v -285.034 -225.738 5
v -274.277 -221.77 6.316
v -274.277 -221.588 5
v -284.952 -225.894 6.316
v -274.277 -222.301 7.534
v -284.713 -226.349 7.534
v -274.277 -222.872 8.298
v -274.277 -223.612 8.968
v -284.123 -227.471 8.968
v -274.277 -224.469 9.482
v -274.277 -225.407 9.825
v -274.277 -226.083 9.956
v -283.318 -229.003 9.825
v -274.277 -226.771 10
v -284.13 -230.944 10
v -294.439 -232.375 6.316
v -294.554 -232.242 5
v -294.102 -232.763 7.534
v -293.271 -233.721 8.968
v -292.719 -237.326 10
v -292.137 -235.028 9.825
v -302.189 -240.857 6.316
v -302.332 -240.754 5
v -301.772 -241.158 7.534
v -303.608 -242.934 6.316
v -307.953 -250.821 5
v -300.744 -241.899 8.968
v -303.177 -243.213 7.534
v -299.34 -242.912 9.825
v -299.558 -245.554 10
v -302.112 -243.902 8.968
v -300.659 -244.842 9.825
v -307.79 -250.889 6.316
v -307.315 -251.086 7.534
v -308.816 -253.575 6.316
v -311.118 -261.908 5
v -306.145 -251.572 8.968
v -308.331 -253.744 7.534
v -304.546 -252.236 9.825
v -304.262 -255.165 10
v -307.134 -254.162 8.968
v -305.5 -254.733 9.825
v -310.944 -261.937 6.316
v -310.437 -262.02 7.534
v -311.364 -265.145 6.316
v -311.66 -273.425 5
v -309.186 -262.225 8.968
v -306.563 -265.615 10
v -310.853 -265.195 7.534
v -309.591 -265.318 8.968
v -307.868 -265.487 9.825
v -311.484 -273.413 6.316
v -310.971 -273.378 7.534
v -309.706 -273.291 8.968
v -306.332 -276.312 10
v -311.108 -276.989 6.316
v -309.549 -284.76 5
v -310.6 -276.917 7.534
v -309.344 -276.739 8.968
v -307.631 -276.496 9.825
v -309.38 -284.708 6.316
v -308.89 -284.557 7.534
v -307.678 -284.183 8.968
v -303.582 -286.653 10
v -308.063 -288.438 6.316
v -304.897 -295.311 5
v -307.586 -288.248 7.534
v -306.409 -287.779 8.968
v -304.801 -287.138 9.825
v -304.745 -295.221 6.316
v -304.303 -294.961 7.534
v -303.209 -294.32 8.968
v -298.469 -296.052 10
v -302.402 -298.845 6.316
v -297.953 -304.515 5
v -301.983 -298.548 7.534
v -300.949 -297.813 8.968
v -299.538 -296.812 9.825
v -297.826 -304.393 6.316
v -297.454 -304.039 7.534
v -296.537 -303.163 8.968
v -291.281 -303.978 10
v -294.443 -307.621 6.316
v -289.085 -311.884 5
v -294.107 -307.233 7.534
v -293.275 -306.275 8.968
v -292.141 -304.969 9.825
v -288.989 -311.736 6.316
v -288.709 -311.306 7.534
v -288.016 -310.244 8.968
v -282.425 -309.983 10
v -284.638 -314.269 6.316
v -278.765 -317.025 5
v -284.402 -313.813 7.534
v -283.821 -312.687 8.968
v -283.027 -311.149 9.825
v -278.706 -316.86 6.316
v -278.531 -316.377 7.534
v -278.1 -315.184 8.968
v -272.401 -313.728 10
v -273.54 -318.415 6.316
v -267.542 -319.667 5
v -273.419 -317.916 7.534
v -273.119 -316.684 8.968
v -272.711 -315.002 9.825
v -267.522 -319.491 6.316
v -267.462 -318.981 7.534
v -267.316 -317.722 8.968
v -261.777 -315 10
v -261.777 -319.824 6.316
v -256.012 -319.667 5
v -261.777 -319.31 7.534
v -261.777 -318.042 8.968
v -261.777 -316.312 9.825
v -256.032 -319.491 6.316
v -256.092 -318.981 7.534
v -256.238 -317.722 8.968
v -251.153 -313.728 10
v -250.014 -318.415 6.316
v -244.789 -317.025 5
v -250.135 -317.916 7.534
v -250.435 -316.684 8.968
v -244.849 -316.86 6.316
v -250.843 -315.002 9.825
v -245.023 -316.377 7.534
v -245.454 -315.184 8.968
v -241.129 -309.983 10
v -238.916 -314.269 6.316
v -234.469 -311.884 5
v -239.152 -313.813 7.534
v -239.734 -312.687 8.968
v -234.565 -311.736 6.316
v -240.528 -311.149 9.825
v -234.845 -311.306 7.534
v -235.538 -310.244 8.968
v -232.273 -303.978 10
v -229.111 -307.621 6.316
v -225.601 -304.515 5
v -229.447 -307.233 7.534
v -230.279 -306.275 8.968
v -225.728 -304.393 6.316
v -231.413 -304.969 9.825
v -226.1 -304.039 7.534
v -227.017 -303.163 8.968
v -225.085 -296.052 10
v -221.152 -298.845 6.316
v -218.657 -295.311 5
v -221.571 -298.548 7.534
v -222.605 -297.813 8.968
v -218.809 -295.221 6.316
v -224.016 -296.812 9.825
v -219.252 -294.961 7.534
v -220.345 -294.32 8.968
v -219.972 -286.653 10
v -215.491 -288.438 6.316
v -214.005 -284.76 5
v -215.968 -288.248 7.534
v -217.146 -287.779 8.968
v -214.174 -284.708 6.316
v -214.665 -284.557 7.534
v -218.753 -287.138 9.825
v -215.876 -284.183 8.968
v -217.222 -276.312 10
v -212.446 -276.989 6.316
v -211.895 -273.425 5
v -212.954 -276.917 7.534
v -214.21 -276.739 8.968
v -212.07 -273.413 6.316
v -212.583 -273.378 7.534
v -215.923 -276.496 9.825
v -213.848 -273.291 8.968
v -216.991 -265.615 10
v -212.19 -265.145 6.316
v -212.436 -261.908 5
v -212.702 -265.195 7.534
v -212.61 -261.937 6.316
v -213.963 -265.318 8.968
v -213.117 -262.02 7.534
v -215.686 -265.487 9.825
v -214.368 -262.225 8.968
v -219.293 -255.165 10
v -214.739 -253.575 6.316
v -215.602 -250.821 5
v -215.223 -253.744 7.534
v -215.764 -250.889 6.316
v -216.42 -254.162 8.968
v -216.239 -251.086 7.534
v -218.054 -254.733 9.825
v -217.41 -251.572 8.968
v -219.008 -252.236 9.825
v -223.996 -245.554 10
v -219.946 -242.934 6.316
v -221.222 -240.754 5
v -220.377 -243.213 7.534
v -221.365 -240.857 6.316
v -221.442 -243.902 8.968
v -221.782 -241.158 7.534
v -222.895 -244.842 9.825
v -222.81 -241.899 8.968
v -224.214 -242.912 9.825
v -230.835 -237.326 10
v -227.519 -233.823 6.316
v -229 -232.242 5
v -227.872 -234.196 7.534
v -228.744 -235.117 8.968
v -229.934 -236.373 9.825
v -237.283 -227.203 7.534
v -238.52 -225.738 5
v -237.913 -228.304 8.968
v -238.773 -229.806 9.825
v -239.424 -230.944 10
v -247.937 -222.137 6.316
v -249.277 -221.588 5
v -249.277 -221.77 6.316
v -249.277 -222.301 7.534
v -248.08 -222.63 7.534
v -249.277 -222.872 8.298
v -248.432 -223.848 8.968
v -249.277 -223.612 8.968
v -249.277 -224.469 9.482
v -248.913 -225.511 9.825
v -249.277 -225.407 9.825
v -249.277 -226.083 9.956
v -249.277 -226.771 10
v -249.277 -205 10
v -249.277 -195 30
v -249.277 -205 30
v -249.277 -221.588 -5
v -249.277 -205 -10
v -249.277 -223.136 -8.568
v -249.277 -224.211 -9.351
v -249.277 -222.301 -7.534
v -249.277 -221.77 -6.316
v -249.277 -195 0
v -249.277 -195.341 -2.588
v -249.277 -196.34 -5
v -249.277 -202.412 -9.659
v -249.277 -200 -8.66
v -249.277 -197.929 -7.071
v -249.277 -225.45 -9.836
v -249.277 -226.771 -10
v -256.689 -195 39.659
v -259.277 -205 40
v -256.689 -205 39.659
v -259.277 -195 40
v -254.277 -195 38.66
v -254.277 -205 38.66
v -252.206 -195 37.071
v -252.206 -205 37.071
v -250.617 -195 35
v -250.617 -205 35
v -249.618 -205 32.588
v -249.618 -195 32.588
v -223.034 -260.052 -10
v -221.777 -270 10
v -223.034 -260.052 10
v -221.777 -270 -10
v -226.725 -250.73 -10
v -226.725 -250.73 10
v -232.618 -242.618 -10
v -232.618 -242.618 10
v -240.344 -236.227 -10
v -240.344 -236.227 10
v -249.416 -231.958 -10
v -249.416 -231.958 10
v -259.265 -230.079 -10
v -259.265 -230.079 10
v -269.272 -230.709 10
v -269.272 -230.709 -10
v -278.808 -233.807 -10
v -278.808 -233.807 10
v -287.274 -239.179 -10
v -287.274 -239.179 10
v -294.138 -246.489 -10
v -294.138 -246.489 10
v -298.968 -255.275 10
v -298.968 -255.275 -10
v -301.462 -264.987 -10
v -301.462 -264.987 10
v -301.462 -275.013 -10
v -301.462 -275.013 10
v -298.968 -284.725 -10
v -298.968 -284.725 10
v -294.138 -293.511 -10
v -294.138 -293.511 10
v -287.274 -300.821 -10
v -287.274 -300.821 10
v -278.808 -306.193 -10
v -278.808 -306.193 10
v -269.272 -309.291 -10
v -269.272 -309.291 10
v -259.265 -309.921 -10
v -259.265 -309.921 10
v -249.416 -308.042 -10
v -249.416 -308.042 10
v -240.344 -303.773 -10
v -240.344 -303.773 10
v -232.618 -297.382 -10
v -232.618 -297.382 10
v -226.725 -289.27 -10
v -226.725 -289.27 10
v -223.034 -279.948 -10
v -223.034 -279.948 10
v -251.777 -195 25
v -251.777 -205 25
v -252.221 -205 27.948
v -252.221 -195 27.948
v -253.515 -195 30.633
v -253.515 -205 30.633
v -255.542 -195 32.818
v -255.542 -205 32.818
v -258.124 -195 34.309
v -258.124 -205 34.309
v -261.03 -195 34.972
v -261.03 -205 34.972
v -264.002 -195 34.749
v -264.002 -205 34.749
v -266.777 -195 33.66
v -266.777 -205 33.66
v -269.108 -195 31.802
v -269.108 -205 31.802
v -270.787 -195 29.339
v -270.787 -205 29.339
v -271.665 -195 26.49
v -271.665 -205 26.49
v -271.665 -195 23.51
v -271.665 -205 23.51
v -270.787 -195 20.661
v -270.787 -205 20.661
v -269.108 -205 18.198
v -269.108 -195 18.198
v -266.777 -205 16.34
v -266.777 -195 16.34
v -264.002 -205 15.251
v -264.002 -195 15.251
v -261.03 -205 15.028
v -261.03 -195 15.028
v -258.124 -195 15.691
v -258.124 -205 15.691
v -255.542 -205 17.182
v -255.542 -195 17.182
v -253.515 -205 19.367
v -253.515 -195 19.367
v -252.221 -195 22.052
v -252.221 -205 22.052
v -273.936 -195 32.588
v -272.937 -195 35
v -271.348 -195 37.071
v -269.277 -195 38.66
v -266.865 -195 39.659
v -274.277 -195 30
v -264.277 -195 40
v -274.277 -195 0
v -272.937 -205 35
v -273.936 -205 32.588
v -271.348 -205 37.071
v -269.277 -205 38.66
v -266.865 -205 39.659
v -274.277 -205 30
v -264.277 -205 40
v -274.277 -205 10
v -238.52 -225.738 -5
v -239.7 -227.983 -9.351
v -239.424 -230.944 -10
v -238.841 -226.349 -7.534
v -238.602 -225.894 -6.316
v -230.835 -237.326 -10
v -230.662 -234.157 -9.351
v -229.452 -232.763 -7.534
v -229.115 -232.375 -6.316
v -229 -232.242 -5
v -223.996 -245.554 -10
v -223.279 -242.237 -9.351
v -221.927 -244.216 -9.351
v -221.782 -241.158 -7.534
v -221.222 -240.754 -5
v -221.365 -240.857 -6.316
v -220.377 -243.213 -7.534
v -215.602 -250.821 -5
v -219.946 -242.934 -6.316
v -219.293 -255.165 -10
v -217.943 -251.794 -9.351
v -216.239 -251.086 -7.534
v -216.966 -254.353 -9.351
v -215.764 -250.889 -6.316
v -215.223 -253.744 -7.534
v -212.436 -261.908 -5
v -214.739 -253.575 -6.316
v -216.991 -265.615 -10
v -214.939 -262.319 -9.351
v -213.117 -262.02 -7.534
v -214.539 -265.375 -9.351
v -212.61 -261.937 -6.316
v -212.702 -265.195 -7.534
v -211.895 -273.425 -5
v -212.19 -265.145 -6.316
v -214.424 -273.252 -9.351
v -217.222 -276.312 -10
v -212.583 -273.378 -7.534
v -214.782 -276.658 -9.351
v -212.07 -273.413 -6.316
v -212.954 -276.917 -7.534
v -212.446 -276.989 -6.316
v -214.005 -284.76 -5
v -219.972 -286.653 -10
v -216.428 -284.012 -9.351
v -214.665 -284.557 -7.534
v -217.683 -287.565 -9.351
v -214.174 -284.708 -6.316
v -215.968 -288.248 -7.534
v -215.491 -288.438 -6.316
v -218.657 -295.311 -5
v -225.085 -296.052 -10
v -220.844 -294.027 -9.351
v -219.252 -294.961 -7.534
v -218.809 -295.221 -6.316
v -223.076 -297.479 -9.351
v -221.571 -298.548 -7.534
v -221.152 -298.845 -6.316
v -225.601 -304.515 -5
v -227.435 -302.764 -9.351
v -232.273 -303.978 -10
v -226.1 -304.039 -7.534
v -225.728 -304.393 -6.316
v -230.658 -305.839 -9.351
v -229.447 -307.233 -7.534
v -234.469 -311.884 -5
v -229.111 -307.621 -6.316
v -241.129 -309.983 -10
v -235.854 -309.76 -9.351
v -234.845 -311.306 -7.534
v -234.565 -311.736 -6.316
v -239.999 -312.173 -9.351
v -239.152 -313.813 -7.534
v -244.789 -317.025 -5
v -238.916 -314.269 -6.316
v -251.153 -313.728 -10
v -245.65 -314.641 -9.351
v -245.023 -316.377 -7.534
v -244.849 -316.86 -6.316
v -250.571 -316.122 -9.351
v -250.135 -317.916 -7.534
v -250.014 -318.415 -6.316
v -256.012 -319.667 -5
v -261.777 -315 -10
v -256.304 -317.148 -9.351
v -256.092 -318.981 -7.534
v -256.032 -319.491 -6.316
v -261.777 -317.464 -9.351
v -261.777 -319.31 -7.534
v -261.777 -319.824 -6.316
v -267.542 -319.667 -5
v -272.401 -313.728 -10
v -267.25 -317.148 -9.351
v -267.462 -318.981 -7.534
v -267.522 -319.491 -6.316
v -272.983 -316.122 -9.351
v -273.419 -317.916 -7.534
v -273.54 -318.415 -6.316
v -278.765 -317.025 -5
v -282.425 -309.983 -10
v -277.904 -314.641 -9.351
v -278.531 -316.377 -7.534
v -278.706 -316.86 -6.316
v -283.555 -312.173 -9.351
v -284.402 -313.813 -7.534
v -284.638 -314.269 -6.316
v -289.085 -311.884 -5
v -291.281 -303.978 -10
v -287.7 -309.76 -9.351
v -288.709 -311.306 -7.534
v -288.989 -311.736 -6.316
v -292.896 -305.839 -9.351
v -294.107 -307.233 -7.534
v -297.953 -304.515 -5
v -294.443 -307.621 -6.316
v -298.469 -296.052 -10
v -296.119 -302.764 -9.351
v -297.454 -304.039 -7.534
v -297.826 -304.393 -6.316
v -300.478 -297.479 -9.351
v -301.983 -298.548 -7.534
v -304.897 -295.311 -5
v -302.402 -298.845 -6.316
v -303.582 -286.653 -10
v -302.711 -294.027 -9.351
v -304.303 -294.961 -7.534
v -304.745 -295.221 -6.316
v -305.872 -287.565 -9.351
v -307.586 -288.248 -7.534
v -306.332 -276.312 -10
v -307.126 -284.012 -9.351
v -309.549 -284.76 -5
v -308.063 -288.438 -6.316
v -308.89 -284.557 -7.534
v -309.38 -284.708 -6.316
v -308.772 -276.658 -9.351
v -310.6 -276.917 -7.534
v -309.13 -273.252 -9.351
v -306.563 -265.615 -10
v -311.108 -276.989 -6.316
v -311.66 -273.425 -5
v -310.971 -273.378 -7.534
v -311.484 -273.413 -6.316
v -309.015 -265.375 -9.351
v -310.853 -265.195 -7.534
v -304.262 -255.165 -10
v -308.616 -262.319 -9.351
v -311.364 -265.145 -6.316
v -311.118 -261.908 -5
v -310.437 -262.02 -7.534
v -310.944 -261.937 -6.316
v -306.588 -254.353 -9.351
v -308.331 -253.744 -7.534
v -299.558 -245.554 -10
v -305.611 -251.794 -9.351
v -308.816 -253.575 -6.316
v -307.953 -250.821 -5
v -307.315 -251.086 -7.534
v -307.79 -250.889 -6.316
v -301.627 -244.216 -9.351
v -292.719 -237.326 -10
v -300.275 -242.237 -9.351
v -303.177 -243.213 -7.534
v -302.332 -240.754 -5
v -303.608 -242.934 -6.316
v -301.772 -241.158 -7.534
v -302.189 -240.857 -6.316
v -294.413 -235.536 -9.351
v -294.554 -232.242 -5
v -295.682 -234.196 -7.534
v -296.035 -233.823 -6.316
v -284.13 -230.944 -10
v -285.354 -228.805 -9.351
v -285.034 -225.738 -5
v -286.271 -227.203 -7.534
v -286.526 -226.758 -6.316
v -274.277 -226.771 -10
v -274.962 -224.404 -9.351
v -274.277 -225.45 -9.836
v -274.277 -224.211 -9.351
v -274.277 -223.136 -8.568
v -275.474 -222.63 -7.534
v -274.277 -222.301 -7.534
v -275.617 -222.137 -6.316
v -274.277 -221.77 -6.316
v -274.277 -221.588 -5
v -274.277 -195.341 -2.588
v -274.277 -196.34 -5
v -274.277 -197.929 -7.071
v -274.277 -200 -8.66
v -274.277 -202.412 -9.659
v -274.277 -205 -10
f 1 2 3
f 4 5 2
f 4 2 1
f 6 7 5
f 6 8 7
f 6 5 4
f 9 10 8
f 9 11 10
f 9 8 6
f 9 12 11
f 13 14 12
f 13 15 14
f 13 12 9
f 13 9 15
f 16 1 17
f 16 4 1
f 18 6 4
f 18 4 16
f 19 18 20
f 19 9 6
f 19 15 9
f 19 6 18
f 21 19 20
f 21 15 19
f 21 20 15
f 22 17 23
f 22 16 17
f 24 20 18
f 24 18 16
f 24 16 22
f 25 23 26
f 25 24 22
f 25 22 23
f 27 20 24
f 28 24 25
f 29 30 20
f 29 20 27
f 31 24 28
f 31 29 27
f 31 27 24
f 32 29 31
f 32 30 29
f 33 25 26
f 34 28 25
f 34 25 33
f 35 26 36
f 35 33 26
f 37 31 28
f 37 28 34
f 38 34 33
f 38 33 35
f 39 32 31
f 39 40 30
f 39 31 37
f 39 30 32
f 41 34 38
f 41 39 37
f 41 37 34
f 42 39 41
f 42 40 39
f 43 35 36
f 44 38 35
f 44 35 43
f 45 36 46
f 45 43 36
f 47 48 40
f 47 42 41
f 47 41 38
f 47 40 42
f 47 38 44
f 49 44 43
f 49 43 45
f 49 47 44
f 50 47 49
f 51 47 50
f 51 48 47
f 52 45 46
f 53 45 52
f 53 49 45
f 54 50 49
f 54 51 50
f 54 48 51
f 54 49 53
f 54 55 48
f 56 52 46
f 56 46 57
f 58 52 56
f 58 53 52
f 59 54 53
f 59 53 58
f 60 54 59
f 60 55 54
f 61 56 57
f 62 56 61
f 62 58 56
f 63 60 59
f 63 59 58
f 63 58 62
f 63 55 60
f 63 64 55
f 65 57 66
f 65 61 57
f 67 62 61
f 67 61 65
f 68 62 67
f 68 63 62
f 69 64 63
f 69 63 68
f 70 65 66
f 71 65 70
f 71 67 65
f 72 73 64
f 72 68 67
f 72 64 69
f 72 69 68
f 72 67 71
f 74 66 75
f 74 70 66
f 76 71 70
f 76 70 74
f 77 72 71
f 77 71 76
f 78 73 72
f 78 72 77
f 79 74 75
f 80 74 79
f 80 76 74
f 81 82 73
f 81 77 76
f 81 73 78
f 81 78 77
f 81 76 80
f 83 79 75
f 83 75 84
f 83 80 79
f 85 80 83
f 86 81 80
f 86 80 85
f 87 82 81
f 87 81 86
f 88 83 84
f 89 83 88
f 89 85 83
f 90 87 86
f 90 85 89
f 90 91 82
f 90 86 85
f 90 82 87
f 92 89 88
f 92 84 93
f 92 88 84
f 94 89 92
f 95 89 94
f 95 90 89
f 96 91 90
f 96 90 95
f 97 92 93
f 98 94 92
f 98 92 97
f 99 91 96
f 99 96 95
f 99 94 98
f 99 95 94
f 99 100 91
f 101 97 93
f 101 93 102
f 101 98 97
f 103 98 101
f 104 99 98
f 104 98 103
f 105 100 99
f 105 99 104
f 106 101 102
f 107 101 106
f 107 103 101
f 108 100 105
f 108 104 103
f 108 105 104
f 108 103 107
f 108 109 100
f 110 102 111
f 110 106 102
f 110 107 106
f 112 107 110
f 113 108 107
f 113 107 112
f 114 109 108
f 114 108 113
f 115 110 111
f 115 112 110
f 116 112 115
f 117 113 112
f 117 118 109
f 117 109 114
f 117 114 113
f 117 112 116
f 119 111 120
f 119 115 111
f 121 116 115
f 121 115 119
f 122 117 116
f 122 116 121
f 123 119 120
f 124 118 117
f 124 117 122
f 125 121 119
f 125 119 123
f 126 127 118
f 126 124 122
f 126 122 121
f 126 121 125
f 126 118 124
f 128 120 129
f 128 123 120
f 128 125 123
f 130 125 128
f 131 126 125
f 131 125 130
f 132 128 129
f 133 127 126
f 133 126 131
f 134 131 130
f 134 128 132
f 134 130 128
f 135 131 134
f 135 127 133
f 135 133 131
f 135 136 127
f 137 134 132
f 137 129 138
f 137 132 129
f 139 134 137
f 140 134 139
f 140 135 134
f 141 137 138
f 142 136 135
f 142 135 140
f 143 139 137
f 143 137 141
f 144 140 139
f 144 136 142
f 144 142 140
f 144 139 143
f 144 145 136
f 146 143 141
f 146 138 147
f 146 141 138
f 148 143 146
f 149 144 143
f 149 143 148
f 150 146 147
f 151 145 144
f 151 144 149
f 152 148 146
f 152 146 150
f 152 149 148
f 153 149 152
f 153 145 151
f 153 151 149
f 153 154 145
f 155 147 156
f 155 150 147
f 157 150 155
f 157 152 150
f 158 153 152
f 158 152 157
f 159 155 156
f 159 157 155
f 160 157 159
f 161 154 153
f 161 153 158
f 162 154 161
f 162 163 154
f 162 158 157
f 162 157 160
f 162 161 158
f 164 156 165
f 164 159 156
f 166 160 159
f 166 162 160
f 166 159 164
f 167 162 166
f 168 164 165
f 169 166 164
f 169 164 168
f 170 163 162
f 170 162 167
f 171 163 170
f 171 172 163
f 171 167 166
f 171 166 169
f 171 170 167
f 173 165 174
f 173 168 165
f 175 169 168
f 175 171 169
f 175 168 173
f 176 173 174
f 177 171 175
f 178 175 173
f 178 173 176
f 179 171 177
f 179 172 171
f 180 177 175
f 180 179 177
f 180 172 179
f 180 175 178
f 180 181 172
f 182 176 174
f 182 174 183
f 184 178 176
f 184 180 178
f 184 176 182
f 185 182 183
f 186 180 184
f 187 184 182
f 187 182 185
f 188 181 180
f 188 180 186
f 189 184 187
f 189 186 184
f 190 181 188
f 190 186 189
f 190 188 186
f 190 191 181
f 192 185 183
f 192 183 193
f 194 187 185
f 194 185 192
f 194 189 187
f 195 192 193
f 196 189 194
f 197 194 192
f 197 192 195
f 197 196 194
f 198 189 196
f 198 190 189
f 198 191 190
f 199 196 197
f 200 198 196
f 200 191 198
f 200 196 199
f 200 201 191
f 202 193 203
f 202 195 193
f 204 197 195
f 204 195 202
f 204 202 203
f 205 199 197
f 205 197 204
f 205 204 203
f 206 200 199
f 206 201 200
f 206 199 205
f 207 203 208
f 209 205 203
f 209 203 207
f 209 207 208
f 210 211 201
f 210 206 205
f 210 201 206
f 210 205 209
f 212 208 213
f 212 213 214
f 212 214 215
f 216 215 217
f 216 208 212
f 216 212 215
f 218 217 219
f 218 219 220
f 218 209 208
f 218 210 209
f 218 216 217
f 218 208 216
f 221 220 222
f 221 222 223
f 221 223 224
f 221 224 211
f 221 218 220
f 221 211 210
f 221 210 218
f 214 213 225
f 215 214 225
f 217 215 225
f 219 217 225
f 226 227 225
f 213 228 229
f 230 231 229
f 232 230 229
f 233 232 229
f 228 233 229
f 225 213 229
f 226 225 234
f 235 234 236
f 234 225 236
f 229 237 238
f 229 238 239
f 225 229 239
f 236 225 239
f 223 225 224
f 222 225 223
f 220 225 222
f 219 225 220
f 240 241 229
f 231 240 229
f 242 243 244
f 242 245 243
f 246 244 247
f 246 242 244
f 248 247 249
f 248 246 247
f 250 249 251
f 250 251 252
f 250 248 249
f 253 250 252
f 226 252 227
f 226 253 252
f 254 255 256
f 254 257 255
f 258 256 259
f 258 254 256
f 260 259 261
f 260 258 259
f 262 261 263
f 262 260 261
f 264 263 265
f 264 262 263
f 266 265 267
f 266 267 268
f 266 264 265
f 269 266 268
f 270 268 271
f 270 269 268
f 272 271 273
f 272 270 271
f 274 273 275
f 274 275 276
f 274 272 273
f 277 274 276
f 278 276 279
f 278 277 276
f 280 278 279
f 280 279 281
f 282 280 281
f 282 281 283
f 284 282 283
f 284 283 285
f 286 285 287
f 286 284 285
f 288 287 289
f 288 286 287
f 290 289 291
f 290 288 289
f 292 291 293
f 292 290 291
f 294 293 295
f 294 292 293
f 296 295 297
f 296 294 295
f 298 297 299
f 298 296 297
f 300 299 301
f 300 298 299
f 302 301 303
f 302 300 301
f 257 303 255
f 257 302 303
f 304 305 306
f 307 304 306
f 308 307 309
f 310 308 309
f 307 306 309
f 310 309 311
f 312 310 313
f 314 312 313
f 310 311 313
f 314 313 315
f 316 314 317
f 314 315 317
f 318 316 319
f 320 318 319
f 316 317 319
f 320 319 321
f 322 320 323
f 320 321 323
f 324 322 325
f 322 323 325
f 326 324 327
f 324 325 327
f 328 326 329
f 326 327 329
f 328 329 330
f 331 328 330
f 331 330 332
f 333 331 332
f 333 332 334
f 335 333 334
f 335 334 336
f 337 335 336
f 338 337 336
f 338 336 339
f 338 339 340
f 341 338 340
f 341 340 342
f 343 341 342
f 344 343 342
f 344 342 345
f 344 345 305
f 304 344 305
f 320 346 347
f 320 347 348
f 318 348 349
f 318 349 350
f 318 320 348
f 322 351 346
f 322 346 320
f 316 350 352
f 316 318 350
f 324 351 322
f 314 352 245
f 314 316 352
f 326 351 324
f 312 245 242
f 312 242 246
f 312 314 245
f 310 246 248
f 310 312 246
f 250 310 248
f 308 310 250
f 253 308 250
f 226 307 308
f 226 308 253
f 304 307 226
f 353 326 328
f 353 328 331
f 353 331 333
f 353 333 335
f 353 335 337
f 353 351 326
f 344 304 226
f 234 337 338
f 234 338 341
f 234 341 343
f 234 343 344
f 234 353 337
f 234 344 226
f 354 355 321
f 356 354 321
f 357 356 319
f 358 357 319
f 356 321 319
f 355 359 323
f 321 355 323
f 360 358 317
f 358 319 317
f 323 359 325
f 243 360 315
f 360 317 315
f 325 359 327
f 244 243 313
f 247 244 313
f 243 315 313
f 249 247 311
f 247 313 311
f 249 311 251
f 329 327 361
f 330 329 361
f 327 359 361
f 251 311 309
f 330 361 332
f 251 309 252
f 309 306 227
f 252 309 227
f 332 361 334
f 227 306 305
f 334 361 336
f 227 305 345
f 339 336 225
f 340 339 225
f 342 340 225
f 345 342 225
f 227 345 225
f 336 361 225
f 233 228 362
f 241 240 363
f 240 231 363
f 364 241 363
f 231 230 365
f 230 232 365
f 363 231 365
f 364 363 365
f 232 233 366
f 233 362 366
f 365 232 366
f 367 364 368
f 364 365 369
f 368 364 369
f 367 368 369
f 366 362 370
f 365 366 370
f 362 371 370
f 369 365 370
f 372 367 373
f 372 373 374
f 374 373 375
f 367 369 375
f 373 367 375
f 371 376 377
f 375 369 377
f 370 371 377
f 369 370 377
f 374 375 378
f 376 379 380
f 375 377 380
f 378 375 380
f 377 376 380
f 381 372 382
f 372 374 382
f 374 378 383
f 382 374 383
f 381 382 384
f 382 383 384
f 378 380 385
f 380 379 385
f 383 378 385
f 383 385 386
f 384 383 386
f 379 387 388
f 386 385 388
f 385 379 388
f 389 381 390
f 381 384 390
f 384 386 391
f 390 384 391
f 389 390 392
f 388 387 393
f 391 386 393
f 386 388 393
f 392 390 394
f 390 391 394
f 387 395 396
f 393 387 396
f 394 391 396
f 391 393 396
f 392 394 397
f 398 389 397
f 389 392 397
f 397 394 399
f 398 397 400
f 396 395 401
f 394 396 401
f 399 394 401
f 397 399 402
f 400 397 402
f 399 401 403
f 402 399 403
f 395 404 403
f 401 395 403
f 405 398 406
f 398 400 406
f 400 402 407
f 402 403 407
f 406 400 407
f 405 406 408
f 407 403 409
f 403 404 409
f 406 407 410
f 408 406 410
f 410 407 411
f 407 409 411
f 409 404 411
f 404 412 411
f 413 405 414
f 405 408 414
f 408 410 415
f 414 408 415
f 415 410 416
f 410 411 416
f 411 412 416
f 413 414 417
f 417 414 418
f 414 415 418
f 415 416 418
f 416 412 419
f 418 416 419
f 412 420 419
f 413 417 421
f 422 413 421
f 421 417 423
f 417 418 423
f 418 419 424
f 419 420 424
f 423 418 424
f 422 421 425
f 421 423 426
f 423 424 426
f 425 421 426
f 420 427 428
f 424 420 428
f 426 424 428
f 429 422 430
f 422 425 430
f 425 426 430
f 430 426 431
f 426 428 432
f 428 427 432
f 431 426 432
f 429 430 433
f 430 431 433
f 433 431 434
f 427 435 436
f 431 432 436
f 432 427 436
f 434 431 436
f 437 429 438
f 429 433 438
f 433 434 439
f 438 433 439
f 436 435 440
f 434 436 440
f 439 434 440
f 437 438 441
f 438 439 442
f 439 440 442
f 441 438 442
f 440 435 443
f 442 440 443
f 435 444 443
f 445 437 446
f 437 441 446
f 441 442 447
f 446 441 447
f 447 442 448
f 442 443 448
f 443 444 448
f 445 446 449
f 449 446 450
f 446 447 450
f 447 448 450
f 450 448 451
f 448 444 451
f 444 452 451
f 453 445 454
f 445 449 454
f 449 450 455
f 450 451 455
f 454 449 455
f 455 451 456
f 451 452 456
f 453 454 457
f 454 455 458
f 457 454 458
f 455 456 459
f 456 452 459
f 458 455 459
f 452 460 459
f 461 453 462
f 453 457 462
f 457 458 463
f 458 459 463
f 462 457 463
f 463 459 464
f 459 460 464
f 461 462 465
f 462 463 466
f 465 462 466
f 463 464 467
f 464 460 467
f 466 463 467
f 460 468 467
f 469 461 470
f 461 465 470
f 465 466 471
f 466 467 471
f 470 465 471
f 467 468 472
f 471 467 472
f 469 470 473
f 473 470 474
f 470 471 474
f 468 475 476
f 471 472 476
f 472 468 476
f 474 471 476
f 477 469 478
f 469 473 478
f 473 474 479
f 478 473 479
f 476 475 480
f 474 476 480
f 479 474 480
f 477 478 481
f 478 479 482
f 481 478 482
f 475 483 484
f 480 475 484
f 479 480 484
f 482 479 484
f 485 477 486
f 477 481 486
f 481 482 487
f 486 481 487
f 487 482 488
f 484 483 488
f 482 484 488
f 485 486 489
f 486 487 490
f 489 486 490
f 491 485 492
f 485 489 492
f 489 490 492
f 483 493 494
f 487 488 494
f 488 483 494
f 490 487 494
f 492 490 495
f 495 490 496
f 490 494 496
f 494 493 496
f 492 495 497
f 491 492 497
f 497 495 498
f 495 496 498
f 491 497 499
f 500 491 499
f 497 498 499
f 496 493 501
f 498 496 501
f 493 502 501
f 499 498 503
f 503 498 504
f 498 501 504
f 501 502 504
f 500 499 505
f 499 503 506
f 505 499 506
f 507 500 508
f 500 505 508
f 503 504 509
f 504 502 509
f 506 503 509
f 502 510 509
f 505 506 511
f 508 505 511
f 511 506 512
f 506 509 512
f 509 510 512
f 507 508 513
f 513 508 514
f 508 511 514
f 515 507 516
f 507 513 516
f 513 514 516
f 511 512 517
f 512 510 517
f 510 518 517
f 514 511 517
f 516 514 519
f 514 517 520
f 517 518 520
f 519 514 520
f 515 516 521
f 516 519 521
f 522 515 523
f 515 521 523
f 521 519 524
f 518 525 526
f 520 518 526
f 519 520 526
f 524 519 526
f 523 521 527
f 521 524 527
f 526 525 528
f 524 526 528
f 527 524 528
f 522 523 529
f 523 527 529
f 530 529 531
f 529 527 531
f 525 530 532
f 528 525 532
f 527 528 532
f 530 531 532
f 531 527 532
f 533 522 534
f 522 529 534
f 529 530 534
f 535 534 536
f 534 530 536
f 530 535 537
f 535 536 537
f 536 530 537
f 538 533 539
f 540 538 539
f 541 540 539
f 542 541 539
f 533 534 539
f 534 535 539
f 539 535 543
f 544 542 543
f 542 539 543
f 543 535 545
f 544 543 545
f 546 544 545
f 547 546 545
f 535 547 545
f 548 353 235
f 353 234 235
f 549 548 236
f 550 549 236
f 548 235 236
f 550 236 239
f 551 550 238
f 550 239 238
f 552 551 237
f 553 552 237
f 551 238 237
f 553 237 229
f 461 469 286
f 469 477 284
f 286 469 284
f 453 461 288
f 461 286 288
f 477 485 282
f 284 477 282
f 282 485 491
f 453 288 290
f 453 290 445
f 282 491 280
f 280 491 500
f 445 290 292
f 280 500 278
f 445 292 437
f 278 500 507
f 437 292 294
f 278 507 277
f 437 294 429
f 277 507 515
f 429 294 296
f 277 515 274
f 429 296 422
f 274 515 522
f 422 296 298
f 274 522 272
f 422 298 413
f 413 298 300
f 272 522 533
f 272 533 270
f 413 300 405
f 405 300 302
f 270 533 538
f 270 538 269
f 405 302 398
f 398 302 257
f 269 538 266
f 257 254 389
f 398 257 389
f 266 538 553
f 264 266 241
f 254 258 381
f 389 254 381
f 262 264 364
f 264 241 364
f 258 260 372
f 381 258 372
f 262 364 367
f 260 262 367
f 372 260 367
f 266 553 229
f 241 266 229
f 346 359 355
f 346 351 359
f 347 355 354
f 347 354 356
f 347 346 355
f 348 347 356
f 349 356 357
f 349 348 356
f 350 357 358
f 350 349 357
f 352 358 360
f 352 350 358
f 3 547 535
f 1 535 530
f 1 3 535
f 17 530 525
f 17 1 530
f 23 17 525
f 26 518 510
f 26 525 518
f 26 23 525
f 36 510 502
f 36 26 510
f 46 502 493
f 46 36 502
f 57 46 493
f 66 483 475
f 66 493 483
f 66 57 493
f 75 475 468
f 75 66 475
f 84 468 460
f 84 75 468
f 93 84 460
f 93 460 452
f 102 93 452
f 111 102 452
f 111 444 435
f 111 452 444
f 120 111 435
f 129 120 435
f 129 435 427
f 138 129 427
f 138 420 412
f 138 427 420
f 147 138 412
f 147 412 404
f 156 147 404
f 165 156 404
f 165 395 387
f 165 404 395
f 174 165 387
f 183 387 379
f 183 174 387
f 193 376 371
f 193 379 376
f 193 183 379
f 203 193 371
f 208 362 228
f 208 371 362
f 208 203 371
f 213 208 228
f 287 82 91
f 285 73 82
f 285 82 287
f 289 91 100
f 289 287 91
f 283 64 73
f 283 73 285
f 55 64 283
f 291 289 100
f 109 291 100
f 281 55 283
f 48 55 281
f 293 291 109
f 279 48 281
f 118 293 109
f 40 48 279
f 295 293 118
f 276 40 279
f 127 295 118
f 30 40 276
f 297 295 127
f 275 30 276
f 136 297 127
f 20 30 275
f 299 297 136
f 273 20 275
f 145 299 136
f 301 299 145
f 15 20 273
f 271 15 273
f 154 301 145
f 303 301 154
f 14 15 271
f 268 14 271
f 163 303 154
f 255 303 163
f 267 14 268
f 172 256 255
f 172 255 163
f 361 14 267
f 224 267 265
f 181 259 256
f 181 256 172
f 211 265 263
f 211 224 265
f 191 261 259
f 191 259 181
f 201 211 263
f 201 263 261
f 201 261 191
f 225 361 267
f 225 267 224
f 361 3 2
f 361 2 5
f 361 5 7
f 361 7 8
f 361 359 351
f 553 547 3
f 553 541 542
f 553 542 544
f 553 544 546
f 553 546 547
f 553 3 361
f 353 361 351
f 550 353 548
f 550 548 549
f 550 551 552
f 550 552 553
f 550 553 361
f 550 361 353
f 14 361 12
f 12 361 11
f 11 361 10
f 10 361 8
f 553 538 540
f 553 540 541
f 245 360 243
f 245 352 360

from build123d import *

# Parameters (mm, degrees)
SKETCH2_R             = 50
SKETCH2_R_2           = 40
BOSS_EXTRUDE1_DEPTH   = 10
SKETCH2_W             = 25
SKETCH2_H             = 5
BOSS_EXTRUDE1_2_DEPTH = 10
SKETCH3_W             = 25
SKETCH3_H             = 20
BOSS_EXTRUDE2_DEPTH   = 21.587708
SKETCH4_W             = 25
SKETCH4_H             = 10
BOSS_EXTRUDE3_DEPTH   = 30
CUT_EXTRUDE1_REACH    = 12
SKETCH5_R             = 10
FILLET1_R             = 10
FILLET2_R             = 10
FILLET3_R             = 5


with BuildPart() as part:
    # Sketch2 → Boss-Extrude1 (new body, symmetric)
    with BuildSketch(Plane.XY):
        with Locations((-261.777043848, -270)):
            Circle(SKETCH2_R)
        with Locations((-261.777043848, -270)):
            Circle(SKETCH2_R_2, mode=Mode.SUBTRACT)
    extrude(amount=BOSS_EXTRUDE1_DEPTH, both=True)



with BuildPart() as body_2:
    # Sketch2 → Boss-Extrude1 2 (new body, symmetric)
    with BuildSketch(Plane.XY):
        with Locations((-261.777043848, -197.5)):
            Rectangle(SKETCH2_W, SKETCH2_H)
    extrude(amount=BOSS_EXTRUDE1_2_DEPTH, both=True)


with BuildPart() as part_1:
    add(part.part)

    add(body_2.part)  # Boss-Extrude2 merges body 2
    # Sketch3 → Boss-Extrude2 (add)
    with BuildSketch(Plane.XZ.offset(200)):
        with Locations((-261.777043848, 0)):
            Rectangle(SKETCH3_W, SKETCH3_H)
    extrude(amount=BOSS_EXTRUDE2_DEPTH)

    # Sketch4 → Boss-Extrude3 (add)
    with BuildSketch(Plane.XY.offset(10)):
        with Locations((-261.777043848, -200)):
            Rectangle(SKETCH4_W, SKETCH4_H)
    extrude(amount=BOSS_EXTRUDE3_DEPTH)

    # Sketch5 → Cut-Extrude1 (cut, up to next)
    with BuildSketch(Plane.XZ.offset(205), mode=Mode.PRIVATE) as cut_extrude1_sk1:
        with Locations((-261.777043848, 25)):
            Circle(SKETCH5_R)
    cut_extrude1_tool1 = extrude(cut_extrude1_sk1.sketch, amount=-CUT_EXTRUDE1_REACH, mode=Mode.PRIVATE) & part_1.part
    add(cut_extrude1_tool1.solids().sort_by_distance((-261.777044, -205, 25))[0], mode=Mode.SUBTRACT)

    # Fillet1
    fillet1_edges = [part_1.edges().sort_by_distance(p)[0] for p in [
        (-274.277043848, -200, 40),
        (-249.277043848, -200, 40),
    ]]
    fillet(fillet1_edges, radius=FILLET1_R)

    # Fillet2
    fillet2_edges = [part_1.edges().sort_by_distance(p)[0] for p in [
        (-261.777043848, -195, -10),
    ]]
    fillet(fillet2_edges, radius=FILLET2_R)

    # Fillet3
    fillet3_edges = [part_1.edges().sort_by_distance(p)[0] for p in [
        (-261.777043848, -320, 10),
        (-261.777043848, -320, -10),
    ]]
    fillet(fillet3_edges, radius=FILLET3_R)


solid = part_1.part
